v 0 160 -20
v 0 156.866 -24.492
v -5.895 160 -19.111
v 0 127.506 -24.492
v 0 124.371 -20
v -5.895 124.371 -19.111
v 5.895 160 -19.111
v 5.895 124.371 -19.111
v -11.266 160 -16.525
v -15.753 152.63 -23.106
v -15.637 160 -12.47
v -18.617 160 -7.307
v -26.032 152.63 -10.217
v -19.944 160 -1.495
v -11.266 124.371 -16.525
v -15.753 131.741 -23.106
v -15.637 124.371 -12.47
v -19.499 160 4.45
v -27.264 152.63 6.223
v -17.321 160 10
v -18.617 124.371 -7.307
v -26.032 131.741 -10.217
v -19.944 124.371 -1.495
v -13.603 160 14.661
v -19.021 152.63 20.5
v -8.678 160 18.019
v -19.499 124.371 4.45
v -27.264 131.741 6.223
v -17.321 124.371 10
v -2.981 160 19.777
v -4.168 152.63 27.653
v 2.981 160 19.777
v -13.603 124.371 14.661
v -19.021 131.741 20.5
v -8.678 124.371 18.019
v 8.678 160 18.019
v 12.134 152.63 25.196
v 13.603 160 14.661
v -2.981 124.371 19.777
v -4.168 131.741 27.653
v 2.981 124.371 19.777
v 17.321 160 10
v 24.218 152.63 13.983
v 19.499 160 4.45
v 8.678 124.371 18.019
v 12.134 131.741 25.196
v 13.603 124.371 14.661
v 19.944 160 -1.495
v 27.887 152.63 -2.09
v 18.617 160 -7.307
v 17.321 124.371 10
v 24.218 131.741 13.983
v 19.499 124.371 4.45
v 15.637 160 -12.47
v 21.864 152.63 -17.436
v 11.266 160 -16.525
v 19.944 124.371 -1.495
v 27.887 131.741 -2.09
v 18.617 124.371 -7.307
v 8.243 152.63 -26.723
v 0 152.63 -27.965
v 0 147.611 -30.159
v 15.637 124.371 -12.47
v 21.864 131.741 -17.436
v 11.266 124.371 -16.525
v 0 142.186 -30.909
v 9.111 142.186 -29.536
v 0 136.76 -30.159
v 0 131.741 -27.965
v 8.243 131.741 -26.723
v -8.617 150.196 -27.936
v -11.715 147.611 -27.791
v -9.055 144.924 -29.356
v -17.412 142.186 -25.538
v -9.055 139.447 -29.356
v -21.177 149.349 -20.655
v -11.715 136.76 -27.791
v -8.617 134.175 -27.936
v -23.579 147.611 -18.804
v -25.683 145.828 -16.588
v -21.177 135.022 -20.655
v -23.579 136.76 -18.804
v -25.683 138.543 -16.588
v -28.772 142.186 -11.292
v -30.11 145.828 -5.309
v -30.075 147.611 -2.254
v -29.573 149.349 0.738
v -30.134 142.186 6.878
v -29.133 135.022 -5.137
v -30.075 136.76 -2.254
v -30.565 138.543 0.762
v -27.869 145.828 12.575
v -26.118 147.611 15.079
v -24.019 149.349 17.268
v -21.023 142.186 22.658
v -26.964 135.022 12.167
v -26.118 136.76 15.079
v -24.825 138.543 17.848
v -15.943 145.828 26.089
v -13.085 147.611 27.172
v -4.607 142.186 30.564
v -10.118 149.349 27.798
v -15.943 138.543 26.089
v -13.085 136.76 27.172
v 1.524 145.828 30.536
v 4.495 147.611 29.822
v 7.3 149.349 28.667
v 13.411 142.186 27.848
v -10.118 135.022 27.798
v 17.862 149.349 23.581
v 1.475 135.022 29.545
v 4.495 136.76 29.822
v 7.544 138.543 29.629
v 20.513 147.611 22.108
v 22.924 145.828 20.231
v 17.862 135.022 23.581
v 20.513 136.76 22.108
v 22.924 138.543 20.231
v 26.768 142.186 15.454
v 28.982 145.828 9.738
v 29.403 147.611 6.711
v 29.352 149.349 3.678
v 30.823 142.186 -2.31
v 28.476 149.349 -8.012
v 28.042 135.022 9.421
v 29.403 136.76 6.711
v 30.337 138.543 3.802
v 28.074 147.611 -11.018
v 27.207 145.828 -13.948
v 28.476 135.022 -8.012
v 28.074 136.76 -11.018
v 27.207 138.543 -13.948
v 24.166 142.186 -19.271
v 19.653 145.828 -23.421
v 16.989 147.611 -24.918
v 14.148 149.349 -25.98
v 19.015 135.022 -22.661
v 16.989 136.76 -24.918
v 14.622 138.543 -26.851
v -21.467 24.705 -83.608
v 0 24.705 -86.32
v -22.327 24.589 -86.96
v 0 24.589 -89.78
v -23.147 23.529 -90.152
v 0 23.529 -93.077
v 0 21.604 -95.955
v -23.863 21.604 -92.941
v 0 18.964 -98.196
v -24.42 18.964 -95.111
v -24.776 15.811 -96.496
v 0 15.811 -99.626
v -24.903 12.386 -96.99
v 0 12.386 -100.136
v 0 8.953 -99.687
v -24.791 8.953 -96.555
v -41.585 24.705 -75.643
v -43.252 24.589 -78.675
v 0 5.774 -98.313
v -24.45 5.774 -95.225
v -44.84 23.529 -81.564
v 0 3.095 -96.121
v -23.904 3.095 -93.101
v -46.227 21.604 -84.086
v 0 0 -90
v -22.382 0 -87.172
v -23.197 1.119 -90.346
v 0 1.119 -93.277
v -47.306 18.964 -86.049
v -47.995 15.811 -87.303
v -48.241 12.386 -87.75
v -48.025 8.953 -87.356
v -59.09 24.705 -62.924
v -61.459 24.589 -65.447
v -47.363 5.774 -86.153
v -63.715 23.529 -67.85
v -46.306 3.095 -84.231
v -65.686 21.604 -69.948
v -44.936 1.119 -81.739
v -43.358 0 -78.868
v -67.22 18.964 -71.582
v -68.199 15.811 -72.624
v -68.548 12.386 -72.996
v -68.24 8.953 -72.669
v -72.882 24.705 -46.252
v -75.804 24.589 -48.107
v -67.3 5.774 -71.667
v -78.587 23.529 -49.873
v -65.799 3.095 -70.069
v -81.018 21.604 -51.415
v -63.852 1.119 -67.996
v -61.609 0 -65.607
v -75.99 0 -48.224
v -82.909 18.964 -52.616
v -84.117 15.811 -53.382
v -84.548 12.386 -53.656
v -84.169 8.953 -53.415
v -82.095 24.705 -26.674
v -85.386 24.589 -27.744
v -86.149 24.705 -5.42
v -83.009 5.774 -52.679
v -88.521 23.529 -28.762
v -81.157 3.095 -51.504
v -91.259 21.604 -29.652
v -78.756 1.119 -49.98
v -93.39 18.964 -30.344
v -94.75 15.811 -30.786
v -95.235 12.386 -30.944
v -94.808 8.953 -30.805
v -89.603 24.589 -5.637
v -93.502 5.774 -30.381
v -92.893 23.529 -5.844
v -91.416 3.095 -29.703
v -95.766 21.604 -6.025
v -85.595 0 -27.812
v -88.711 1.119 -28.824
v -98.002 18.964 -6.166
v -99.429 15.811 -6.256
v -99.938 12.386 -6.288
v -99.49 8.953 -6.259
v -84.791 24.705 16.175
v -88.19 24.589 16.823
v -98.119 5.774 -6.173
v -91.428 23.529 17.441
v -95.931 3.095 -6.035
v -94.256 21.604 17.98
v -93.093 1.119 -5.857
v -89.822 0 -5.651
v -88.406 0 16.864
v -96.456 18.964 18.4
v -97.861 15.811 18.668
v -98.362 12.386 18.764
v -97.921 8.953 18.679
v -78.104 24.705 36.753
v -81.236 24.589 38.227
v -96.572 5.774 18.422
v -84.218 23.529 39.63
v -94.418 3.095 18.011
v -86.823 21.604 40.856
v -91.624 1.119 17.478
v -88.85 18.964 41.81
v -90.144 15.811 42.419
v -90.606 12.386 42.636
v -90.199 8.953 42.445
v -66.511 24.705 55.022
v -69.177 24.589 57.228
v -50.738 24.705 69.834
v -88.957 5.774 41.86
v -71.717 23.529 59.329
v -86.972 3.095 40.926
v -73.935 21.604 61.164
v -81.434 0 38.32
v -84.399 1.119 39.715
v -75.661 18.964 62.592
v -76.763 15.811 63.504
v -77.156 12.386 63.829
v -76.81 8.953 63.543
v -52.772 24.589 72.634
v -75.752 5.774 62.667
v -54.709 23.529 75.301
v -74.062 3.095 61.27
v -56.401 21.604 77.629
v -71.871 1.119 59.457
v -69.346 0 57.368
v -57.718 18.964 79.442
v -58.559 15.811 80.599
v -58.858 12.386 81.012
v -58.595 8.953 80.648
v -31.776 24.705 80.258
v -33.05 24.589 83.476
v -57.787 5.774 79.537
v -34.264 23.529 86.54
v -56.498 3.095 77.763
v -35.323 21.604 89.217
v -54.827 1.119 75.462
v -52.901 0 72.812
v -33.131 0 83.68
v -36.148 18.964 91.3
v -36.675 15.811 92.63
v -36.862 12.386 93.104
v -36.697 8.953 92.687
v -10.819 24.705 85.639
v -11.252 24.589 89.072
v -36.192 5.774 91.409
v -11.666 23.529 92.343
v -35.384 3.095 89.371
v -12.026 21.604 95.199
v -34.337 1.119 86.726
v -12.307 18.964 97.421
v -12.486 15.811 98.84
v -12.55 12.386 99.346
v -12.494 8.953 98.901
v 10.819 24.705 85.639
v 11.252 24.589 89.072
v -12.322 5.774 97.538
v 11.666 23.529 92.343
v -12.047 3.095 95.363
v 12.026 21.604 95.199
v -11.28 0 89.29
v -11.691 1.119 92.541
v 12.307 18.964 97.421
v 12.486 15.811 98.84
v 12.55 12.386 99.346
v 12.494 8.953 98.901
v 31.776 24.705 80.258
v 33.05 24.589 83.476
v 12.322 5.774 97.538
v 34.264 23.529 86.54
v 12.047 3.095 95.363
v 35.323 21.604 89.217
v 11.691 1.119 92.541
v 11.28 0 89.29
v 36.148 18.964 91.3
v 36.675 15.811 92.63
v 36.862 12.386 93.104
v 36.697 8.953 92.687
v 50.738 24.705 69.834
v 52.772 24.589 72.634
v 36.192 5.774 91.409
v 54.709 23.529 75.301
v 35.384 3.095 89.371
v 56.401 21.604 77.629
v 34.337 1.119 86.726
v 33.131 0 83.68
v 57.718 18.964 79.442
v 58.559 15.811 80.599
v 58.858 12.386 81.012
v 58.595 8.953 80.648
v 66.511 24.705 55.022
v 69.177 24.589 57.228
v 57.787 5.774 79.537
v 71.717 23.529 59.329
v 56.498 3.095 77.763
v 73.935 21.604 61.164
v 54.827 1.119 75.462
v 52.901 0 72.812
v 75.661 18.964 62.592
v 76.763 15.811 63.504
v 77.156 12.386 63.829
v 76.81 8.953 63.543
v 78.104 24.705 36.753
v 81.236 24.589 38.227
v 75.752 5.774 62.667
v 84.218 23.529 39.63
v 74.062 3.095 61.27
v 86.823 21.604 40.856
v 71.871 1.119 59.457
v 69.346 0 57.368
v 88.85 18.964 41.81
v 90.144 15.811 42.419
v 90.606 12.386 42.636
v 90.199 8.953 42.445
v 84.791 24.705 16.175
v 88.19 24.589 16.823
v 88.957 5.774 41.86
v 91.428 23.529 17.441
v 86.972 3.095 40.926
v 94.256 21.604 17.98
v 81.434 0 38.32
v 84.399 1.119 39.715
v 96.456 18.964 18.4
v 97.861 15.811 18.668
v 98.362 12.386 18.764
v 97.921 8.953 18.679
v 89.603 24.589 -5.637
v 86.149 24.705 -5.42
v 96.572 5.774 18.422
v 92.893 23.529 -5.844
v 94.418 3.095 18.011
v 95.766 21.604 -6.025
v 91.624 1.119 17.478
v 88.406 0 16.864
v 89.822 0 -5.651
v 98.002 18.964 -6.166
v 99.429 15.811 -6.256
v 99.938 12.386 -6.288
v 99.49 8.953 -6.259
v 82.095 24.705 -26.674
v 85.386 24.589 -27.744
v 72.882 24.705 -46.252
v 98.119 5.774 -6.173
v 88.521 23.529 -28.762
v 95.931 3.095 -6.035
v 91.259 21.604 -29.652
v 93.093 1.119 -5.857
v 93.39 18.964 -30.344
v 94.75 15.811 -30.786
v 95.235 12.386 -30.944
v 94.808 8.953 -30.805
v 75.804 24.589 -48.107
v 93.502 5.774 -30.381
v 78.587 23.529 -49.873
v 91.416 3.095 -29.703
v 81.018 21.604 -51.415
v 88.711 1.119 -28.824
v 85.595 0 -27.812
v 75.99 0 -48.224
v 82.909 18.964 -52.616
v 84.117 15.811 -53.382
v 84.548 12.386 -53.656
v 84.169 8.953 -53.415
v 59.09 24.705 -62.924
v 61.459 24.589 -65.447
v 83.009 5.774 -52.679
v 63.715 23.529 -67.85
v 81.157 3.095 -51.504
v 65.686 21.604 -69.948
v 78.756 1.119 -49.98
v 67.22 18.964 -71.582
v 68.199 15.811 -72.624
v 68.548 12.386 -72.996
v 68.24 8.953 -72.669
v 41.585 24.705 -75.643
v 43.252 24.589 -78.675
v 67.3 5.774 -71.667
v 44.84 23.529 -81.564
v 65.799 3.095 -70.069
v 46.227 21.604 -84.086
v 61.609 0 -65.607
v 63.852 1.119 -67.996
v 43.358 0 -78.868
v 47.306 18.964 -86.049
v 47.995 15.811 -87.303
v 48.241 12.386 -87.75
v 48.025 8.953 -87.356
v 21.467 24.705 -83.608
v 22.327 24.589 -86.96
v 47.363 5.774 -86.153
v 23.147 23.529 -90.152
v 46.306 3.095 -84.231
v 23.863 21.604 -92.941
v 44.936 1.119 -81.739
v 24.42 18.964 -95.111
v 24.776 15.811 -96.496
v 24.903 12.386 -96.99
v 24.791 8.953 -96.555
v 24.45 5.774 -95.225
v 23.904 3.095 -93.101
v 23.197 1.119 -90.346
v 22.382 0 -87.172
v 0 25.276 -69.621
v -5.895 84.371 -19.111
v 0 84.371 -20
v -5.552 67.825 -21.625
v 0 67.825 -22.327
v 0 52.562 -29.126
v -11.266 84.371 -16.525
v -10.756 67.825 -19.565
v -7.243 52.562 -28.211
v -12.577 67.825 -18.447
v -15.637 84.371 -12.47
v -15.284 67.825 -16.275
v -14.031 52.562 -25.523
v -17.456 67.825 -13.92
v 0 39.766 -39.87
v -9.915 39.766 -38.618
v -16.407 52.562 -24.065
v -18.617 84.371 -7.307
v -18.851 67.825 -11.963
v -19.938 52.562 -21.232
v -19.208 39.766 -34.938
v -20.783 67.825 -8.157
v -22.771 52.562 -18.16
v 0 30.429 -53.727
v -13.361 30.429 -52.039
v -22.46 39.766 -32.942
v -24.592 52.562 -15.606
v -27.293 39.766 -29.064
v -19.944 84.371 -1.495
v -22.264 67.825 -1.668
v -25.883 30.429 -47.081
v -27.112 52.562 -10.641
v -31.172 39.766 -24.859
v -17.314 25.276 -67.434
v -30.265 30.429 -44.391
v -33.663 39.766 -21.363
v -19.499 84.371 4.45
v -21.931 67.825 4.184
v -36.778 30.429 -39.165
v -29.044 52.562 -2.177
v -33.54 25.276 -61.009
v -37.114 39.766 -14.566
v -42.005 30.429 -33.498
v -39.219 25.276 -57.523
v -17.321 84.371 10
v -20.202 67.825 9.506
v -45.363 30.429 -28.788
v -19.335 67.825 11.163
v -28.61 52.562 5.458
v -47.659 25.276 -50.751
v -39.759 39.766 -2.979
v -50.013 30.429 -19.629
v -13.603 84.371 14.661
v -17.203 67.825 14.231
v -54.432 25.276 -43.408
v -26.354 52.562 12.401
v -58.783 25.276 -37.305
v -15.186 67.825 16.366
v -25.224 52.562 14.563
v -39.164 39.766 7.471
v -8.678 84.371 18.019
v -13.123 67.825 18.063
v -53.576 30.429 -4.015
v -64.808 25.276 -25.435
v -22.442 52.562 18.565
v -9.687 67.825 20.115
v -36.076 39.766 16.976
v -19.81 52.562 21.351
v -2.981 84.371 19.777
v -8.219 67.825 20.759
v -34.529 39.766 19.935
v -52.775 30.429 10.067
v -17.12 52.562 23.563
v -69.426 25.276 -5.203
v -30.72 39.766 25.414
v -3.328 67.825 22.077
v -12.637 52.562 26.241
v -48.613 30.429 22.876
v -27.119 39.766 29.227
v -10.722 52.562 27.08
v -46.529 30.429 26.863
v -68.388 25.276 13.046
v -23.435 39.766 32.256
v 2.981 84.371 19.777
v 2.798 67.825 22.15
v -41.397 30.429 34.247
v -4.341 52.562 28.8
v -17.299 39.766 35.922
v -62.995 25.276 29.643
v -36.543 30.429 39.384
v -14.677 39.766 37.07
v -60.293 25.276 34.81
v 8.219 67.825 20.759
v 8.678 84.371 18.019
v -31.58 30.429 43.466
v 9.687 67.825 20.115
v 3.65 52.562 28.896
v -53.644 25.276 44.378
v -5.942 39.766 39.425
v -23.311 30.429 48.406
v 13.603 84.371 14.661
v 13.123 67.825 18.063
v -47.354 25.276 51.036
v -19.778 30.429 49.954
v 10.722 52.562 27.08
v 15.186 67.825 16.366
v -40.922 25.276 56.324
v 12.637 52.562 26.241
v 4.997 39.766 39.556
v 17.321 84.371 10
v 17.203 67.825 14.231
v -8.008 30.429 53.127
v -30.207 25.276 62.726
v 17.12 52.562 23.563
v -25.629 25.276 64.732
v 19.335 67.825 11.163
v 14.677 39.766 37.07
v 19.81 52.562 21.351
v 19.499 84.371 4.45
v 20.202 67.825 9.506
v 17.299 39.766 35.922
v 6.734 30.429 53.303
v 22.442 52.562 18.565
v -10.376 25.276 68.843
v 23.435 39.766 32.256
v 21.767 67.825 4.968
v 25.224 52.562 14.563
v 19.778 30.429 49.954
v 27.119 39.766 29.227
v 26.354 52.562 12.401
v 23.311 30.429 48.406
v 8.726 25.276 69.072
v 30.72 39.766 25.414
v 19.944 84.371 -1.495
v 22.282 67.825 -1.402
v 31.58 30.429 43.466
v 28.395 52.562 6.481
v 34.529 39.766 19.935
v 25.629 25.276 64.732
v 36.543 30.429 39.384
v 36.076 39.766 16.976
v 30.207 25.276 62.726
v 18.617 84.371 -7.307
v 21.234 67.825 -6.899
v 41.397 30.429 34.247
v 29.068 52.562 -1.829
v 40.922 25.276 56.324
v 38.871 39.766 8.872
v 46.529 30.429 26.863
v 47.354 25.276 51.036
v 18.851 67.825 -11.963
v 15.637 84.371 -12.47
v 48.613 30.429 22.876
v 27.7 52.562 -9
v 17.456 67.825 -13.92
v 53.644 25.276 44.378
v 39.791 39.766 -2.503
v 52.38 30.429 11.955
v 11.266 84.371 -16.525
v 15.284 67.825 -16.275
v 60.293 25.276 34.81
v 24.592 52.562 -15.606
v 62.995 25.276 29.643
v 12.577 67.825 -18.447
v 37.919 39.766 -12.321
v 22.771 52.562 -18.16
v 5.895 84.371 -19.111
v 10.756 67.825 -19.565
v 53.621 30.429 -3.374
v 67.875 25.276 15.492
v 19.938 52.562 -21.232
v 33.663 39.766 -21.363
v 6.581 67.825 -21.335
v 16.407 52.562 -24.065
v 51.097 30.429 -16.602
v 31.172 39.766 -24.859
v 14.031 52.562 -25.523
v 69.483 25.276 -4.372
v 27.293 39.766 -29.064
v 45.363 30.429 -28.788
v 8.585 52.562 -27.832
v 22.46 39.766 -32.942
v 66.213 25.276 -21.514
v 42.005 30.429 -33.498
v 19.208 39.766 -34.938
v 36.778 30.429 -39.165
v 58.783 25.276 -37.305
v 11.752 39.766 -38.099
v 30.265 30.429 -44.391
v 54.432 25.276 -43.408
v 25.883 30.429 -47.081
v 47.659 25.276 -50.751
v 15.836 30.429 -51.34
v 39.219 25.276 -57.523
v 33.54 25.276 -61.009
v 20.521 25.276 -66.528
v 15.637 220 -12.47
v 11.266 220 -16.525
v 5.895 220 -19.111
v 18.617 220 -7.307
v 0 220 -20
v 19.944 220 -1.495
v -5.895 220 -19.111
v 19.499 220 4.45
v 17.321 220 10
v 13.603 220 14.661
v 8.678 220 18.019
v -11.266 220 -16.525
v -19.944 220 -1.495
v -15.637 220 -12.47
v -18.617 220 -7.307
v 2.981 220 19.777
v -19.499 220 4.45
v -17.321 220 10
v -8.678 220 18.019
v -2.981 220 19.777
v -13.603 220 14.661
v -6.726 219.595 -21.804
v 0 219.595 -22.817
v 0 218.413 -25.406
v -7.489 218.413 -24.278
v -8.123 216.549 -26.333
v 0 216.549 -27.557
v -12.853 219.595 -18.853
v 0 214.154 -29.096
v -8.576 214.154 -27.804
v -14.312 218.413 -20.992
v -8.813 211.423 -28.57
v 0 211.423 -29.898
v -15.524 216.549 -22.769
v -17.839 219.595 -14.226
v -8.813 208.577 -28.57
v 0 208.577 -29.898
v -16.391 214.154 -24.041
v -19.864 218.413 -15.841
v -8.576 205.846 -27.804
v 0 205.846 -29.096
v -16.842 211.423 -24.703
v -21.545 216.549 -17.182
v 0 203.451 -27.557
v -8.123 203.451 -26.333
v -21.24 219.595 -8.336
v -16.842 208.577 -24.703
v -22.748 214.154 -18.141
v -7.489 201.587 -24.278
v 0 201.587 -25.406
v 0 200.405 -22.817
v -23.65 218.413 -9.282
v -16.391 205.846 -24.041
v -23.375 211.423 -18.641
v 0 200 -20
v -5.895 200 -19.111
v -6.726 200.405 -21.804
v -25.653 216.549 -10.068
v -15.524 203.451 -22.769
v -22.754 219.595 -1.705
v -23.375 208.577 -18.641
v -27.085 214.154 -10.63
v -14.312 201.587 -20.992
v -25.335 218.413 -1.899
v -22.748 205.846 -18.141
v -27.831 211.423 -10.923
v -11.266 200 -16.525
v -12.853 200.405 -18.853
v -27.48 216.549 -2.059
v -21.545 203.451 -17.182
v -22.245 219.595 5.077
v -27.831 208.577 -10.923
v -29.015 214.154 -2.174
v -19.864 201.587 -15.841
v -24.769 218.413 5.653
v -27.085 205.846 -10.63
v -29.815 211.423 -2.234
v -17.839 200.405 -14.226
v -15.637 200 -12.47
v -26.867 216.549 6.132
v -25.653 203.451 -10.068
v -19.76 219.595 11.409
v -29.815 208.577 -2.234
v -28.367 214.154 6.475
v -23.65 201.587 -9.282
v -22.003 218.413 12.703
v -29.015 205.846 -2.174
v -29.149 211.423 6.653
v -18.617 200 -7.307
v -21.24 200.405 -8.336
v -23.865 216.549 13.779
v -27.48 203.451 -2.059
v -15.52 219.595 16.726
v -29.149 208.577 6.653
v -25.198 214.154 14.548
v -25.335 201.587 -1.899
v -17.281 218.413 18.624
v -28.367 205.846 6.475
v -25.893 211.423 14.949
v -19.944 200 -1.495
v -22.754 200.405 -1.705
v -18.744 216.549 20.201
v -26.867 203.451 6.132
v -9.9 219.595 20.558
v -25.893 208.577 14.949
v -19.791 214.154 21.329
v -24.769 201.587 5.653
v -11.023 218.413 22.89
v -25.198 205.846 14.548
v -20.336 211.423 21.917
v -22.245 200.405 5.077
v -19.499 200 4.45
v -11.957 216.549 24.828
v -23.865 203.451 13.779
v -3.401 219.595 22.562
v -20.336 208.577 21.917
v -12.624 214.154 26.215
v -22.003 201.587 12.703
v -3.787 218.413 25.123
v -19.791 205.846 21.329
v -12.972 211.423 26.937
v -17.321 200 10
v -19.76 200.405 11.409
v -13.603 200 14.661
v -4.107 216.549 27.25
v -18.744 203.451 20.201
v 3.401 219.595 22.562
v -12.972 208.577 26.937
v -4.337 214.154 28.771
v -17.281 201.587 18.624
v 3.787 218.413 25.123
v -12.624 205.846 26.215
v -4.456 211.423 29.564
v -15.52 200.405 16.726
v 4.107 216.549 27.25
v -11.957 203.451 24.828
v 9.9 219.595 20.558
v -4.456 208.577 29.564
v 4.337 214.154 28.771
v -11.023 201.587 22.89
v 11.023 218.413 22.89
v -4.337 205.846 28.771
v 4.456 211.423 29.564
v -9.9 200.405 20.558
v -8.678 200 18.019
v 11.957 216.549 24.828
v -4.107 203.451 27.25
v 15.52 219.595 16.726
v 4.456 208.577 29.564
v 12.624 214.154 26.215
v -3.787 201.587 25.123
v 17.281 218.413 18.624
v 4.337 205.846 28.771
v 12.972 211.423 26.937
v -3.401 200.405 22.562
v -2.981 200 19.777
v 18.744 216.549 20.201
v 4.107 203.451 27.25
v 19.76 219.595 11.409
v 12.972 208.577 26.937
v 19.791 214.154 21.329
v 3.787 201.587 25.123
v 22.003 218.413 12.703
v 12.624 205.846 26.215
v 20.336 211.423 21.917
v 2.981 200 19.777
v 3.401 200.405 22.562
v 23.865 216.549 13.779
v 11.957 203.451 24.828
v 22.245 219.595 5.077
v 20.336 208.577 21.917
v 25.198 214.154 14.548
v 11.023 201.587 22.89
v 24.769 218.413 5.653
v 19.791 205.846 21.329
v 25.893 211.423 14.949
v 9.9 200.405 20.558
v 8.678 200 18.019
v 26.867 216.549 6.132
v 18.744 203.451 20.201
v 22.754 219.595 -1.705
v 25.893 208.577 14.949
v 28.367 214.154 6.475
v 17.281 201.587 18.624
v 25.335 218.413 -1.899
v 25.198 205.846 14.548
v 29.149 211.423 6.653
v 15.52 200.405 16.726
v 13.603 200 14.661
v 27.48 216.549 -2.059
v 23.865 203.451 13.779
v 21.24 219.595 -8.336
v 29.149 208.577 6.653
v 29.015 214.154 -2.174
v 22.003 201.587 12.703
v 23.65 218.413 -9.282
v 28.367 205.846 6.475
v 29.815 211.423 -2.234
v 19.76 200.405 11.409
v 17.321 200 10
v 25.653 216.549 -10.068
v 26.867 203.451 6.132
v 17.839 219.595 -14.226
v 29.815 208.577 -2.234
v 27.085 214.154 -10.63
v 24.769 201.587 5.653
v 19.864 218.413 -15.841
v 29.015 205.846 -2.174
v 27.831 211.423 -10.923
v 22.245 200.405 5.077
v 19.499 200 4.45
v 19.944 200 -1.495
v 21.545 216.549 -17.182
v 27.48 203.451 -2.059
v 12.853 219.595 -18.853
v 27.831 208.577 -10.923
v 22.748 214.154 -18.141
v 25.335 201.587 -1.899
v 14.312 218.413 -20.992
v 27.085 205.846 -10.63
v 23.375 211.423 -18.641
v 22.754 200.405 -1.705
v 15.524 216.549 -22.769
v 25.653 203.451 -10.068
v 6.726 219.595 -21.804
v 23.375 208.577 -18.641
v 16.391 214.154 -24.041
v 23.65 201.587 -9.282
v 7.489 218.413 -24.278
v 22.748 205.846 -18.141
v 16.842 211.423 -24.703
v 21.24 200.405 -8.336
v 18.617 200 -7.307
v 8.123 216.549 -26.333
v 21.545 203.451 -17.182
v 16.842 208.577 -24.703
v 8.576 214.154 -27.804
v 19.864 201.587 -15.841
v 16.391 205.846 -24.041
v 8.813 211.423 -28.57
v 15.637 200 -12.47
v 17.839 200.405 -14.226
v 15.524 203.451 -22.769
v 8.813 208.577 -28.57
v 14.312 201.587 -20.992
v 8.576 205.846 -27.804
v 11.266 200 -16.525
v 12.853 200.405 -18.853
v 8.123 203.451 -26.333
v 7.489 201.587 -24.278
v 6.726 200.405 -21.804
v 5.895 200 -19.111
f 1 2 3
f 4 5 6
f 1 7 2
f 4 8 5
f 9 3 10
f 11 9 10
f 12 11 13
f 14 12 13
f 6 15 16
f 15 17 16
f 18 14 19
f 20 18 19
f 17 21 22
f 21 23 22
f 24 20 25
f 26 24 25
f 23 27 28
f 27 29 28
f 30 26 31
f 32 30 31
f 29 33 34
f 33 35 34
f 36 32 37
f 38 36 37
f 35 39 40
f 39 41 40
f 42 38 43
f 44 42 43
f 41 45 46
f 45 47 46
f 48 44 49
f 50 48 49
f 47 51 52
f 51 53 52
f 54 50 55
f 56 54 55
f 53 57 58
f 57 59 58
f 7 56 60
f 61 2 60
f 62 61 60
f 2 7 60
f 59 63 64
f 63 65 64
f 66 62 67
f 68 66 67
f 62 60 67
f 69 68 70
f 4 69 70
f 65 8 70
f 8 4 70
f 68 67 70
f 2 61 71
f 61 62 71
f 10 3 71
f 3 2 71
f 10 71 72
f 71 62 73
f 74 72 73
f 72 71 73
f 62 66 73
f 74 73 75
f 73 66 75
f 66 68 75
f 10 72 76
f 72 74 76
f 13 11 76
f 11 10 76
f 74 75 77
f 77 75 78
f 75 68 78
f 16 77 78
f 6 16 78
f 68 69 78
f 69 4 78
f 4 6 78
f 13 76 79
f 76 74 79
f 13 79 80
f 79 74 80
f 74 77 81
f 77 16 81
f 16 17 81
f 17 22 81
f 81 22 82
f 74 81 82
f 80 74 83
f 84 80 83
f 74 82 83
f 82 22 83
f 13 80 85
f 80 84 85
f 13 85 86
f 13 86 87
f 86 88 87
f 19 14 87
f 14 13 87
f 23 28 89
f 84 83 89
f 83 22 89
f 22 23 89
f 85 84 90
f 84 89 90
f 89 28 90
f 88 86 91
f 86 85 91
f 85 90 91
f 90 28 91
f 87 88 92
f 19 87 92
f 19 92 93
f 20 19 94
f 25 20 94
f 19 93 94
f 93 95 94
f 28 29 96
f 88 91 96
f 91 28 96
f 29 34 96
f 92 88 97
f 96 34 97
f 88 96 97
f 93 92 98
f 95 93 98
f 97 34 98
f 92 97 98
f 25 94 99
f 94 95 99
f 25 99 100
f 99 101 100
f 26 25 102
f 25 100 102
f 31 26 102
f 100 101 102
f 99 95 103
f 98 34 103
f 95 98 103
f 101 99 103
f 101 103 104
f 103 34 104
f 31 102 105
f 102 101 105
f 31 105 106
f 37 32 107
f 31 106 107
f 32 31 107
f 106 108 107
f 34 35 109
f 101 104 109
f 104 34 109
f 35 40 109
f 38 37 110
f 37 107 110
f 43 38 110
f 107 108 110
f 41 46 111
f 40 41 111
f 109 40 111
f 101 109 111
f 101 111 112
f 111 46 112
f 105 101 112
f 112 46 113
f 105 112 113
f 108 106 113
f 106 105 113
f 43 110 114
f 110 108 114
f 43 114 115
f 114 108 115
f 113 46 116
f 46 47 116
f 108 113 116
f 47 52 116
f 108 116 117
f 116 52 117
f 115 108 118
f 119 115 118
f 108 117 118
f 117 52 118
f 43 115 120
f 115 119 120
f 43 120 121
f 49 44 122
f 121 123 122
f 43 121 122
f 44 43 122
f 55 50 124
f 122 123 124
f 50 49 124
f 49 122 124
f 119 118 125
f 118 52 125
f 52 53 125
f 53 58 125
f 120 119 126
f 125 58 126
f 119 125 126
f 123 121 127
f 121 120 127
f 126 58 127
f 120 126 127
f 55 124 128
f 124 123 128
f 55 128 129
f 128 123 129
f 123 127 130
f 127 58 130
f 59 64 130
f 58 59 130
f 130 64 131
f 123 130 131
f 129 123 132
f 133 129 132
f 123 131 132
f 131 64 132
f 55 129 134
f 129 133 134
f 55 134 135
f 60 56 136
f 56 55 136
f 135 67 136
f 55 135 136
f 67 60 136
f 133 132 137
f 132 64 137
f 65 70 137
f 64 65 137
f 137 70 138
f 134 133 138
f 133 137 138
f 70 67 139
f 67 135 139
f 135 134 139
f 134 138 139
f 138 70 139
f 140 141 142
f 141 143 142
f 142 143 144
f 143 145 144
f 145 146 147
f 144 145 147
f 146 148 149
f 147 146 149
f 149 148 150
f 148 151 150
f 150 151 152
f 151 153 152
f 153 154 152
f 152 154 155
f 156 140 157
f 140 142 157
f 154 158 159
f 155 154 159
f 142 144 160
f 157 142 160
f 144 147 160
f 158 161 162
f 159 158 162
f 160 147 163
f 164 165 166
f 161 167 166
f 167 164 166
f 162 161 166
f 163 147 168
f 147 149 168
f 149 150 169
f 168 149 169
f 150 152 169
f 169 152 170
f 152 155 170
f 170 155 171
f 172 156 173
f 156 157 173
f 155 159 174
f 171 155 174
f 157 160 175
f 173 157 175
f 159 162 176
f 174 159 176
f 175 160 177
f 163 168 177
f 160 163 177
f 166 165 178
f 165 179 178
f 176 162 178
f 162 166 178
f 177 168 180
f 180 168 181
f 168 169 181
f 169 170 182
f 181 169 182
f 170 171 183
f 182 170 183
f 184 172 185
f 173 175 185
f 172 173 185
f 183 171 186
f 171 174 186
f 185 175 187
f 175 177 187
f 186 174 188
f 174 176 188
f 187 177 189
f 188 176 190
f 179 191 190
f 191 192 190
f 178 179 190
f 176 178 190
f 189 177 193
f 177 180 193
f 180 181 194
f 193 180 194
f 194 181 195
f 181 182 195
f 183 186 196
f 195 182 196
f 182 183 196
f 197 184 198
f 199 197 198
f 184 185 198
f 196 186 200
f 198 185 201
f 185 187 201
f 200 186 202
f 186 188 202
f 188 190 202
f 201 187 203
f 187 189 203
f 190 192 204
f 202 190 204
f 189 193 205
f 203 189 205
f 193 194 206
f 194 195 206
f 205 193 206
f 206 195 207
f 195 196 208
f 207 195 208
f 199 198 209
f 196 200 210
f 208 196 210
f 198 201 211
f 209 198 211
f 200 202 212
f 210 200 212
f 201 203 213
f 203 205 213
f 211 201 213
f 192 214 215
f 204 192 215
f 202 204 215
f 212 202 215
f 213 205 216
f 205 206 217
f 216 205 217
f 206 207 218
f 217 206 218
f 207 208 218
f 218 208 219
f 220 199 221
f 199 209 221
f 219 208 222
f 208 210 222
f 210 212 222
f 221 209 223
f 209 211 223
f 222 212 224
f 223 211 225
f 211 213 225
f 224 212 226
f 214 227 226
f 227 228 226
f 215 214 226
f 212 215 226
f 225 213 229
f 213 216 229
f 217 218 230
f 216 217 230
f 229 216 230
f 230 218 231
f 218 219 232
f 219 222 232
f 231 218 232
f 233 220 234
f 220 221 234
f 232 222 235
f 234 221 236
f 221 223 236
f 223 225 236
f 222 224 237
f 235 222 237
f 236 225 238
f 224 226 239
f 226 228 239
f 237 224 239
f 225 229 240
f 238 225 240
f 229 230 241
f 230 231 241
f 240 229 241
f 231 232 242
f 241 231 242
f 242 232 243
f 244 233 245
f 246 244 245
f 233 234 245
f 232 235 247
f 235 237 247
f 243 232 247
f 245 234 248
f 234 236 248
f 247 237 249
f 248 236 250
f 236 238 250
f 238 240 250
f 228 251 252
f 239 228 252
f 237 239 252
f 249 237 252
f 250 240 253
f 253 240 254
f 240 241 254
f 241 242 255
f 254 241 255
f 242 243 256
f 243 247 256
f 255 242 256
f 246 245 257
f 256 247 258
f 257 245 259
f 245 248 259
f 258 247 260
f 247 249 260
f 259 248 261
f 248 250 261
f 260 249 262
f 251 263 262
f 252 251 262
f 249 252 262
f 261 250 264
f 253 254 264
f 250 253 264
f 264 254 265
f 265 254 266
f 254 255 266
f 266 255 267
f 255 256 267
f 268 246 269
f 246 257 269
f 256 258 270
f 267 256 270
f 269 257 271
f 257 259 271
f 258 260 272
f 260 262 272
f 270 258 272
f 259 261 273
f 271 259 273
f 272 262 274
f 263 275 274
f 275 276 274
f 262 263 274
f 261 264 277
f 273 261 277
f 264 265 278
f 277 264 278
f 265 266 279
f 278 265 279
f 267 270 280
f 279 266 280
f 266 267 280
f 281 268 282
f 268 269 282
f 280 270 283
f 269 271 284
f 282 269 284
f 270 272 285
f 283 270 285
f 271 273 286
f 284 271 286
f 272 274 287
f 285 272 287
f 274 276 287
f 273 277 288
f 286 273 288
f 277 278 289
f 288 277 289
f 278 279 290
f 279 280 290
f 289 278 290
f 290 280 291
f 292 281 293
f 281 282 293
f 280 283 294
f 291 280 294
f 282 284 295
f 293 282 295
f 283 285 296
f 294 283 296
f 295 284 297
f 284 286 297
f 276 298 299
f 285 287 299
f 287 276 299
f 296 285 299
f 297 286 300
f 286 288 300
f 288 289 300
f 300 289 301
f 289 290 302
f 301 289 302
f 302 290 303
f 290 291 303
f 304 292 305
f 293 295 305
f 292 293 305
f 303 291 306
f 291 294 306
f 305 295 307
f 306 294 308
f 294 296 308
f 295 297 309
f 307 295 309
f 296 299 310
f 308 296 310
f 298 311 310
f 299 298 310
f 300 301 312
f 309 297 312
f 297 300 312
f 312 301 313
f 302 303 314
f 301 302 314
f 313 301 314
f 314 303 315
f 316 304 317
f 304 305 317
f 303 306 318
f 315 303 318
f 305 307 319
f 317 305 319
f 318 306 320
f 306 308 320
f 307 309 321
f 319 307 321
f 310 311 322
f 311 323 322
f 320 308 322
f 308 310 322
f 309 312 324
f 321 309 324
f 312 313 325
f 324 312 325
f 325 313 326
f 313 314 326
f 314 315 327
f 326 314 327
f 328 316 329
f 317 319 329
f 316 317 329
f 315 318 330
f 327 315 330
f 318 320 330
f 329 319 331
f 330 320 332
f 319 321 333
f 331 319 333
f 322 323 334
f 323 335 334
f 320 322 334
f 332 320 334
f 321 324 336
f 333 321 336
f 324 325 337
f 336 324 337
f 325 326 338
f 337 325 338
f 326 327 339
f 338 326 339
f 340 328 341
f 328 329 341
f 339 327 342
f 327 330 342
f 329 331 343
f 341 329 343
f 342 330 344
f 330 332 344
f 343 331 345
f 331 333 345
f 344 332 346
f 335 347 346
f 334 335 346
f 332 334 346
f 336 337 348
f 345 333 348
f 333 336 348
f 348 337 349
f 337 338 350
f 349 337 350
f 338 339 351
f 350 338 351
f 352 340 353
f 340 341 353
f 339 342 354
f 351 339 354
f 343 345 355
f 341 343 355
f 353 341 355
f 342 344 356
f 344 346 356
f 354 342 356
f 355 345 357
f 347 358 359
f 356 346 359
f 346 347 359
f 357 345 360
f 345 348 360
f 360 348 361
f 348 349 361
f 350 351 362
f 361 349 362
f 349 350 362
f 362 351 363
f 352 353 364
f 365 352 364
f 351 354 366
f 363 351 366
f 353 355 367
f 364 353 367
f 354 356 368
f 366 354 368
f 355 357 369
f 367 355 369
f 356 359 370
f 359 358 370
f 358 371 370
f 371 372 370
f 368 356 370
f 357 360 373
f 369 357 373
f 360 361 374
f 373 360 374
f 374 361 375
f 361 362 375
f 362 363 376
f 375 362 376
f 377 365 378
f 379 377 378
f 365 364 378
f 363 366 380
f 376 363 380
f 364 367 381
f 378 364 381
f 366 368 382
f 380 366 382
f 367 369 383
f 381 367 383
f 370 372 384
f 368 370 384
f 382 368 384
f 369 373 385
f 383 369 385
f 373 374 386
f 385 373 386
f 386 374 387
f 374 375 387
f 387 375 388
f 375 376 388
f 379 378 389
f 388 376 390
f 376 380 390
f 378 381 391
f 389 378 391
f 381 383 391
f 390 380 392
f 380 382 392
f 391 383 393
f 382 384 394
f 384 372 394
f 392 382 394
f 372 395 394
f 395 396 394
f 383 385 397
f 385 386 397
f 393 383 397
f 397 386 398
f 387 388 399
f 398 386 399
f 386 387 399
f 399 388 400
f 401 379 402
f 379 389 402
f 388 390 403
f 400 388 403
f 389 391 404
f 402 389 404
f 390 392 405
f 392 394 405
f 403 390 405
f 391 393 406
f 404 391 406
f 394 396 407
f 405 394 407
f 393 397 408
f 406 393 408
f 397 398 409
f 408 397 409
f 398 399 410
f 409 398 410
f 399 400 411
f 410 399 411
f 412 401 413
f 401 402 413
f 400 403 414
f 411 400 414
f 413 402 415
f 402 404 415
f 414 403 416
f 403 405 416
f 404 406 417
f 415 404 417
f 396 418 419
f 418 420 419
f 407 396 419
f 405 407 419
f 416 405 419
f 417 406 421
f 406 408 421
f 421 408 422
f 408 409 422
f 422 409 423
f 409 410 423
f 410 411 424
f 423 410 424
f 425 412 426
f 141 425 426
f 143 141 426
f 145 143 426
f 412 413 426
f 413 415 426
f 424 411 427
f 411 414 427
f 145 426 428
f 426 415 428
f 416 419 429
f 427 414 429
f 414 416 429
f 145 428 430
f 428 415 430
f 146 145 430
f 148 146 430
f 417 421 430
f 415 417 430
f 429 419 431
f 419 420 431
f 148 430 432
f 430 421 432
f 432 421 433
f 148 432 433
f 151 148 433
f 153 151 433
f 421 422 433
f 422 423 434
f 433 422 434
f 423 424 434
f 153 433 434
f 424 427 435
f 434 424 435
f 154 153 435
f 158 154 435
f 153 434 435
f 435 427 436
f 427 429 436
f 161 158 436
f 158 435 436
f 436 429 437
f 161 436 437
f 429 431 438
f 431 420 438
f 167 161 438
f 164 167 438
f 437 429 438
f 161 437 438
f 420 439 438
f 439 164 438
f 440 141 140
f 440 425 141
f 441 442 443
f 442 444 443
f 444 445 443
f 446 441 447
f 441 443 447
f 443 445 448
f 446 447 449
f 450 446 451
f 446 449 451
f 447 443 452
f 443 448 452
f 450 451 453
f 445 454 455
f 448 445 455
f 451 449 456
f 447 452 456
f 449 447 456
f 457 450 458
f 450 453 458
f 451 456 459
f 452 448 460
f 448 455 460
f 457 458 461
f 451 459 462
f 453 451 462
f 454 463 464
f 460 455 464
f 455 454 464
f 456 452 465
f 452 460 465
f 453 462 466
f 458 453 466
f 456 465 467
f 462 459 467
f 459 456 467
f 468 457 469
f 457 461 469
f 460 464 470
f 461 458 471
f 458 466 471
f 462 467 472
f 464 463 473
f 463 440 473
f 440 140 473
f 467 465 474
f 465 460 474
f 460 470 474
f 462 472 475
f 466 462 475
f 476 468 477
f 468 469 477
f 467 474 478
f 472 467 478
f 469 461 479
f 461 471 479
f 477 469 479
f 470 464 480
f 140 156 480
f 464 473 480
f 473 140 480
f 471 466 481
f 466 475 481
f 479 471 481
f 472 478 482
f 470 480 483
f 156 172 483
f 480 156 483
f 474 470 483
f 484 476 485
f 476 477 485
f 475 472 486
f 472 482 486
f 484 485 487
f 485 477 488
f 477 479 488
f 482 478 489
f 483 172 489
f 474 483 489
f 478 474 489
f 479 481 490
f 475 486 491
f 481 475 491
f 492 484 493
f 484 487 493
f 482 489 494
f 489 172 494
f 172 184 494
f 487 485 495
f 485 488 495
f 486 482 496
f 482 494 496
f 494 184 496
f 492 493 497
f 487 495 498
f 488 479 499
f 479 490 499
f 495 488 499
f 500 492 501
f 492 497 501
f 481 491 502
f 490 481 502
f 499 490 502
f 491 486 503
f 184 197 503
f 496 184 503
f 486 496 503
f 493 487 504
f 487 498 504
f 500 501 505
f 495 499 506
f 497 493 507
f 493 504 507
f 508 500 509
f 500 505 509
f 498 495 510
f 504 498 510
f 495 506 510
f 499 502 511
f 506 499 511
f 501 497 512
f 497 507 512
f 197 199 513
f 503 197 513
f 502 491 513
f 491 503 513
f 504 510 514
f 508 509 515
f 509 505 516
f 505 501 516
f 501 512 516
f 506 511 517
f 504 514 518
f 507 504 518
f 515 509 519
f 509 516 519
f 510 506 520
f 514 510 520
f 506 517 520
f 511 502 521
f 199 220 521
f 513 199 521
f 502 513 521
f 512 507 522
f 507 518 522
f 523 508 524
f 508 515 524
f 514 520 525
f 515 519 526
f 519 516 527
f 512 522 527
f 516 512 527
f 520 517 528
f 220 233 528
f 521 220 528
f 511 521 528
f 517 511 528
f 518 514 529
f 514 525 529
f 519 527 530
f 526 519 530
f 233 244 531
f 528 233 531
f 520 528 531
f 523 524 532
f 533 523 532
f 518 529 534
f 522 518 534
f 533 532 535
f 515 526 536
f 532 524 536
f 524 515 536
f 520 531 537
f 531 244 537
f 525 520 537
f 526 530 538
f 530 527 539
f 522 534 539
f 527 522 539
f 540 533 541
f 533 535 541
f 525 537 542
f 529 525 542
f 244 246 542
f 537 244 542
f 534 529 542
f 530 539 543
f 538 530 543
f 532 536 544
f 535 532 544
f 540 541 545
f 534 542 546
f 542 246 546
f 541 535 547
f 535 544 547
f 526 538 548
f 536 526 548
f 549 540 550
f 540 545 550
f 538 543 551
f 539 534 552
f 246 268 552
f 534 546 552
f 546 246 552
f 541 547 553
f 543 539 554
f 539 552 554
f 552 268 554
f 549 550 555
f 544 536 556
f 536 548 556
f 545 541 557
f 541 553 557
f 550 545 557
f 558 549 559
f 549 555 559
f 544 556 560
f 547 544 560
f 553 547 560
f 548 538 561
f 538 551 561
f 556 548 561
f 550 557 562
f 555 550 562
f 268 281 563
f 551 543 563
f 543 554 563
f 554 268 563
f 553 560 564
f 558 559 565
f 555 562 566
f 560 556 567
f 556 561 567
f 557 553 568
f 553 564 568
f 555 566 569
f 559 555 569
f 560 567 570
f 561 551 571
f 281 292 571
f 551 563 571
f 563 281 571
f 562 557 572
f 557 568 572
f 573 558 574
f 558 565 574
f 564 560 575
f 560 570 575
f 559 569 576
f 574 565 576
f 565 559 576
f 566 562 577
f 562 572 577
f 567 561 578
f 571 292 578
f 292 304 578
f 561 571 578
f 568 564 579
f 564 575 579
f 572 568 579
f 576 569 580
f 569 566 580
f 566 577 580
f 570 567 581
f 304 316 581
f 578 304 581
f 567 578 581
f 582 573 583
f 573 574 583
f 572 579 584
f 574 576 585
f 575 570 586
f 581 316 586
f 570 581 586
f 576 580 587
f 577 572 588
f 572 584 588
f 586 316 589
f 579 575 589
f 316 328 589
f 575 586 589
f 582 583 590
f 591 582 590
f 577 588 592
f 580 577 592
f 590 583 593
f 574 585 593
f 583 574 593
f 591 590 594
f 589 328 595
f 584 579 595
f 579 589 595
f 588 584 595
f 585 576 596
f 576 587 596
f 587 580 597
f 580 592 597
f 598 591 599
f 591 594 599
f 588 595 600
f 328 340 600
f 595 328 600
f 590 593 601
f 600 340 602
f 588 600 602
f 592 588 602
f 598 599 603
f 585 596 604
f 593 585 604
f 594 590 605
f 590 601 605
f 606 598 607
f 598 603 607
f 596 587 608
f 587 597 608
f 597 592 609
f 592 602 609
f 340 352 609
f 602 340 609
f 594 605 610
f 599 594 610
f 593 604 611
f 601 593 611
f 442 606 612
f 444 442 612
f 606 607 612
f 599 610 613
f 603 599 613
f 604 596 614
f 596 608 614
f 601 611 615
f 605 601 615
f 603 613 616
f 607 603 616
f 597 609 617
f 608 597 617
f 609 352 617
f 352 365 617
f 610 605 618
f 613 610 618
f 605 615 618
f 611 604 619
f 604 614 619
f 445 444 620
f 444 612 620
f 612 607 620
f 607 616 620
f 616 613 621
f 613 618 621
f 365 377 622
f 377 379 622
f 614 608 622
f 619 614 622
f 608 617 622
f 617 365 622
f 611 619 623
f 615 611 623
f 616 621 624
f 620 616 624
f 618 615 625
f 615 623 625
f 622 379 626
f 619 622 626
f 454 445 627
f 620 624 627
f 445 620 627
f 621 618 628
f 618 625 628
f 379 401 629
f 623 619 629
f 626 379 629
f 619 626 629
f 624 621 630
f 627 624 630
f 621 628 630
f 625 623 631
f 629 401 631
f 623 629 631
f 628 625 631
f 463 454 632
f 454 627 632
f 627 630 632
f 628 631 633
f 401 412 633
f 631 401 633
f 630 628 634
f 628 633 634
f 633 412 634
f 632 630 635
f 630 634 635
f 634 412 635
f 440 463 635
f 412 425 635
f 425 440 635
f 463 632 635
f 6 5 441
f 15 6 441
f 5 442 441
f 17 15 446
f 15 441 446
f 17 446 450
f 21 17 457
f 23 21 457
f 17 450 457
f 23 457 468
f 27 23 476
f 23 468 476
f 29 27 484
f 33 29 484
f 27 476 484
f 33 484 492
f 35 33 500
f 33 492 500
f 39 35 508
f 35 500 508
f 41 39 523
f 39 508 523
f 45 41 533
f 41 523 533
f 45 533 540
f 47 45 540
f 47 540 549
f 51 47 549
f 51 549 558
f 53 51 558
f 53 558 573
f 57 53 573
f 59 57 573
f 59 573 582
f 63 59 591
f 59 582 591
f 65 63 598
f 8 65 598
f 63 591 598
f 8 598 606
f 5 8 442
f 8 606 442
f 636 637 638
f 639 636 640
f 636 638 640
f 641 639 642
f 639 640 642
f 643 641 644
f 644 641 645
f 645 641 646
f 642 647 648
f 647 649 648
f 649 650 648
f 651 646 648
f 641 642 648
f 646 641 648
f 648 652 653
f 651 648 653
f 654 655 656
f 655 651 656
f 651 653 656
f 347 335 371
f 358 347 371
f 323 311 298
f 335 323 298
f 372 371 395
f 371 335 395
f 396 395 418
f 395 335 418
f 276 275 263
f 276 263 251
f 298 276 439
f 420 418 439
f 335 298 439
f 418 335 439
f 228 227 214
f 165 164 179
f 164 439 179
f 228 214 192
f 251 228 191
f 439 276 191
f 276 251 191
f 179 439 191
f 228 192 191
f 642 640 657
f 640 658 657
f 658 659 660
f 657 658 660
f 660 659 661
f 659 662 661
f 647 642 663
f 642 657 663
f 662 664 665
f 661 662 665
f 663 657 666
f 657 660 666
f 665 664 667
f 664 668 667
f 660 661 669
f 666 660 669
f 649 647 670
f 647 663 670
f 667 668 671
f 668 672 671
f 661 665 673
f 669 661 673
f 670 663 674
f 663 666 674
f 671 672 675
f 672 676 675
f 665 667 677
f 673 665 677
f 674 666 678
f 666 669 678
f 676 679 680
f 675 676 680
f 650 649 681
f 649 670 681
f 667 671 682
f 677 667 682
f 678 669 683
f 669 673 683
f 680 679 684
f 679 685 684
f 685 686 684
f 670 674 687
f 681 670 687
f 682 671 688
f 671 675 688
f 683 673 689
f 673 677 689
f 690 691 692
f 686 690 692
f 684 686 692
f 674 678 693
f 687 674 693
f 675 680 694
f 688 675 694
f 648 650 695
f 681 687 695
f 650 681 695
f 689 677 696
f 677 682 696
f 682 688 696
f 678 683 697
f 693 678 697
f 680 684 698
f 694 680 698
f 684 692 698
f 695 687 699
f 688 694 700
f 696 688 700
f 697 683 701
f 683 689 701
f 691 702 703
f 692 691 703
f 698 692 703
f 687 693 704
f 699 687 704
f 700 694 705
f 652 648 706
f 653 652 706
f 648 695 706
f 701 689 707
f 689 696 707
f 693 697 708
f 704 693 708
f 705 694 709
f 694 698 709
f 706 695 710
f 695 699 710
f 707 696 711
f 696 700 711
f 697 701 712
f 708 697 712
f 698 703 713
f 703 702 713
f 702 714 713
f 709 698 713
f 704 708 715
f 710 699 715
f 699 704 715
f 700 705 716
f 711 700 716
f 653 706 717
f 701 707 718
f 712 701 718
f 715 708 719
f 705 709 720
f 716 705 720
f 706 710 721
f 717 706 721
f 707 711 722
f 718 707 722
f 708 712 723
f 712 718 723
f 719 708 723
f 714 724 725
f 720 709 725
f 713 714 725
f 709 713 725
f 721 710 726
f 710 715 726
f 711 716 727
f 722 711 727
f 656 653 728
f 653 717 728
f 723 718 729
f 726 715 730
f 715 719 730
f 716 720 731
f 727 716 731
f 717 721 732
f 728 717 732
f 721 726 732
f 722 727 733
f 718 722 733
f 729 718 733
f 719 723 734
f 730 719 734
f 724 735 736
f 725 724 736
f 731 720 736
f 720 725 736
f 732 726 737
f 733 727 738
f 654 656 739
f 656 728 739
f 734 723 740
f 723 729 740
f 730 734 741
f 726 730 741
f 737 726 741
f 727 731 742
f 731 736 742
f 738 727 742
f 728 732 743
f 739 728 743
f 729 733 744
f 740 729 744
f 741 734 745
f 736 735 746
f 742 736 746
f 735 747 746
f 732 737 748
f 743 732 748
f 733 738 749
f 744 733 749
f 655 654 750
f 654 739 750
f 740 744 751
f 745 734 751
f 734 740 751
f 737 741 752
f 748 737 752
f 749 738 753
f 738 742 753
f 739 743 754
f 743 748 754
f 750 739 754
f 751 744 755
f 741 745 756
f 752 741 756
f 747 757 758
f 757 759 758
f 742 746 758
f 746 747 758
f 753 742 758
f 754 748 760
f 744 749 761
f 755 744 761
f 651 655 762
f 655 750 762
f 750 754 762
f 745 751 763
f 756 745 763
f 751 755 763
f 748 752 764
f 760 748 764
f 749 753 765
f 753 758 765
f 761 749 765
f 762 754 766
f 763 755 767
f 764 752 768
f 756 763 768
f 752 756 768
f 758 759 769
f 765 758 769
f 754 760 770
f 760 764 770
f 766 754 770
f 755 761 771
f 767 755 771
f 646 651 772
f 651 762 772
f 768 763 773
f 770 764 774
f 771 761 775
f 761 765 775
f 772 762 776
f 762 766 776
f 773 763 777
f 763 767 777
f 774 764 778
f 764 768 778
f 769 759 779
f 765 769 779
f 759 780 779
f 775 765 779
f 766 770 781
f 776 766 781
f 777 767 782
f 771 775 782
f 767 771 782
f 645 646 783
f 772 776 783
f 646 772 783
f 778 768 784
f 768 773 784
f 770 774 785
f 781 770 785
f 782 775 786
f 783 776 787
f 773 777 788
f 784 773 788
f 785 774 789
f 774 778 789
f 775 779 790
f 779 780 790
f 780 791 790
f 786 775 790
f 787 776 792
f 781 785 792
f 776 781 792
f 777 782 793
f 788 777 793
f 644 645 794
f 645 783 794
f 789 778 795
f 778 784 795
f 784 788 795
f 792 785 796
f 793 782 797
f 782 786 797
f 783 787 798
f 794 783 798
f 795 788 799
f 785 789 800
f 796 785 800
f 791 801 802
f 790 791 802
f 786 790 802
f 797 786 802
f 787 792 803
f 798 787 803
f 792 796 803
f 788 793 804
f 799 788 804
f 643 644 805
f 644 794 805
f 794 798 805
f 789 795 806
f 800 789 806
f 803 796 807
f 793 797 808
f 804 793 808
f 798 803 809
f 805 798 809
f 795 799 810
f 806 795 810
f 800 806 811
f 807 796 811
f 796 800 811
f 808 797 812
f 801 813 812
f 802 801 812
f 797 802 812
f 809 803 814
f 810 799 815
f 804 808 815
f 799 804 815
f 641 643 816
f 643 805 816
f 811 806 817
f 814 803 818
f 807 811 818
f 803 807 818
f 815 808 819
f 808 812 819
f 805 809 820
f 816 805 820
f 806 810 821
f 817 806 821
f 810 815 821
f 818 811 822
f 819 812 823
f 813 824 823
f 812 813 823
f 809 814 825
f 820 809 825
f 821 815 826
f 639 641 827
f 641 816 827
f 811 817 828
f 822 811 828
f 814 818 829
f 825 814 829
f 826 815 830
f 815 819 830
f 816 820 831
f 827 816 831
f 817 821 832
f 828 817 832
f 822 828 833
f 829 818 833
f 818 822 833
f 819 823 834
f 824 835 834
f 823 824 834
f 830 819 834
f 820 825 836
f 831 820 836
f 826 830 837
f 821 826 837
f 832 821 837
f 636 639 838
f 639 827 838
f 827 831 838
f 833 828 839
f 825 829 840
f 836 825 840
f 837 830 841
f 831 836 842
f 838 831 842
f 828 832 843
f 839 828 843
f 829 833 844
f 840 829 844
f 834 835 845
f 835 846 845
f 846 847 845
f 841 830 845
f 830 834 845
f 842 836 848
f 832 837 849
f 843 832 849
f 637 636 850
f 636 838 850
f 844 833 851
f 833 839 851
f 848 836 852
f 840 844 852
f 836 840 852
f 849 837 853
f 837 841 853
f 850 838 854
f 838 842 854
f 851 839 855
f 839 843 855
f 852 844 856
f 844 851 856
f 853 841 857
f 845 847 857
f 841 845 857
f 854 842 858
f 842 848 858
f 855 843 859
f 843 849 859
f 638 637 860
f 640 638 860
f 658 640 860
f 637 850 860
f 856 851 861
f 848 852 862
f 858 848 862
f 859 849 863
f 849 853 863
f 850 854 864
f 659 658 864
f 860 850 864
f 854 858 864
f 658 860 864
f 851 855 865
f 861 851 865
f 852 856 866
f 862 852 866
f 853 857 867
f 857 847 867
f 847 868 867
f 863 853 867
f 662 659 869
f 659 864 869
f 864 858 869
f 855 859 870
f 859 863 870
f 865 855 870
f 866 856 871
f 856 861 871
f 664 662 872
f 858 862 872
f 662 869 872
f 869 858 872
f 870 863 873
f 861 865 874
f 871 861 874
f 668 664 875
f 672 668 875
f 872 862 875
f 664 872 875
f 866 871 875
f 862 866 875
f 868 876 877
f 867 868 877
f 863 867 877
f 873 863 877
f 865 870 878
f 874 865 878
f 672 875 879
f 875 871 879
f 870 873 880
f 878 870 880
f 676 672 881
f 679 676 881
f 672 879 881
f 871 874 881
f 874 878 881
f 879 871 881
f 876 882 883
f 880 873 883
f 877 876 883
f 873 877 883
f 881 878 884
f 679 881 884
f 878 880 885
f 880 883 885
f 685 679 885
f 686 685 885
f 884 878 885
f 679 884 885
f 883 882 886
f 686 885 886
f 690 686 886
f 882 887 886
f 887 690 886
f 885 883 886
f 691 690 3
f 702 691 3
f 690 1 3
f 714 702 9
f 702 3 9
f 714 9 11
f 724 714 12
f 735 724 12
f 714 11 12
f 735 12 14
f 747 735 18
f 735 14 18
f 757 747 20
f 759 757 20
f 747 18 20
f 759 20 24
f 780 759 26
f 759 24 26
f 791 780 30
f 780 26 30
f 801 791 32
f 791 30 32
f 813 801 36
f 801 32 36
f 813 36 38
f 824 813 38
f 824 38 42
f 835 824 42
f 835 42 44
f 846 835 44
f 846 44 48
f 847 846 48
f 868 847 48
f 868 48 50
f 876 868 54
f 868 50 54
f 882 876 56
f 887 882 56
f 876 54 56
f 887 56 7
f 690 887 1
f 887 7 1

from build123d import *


with BuildPart() as part:
    # Sketch1 → Revolve1 (revolve)
    with BuildSketch(Plane.XY, mode=Mode.PRIVATE) as revolve1_sk:
        with BuildLine():
            Line((0, 0), (0, 220))
            Line((0, 220), (20, 220))
            ThreePointArc((20, 220), (30, 210), (20, 200))
            Line((20, 200), (20, 160))
            ThreePointArc((20, 160), (30.908939581, 142.185606368), (20, 124.371212737))
            Line((20, 124.371212737), (20, 84.371212737))
            ThreePointArc((20, 84.371212737), (39.870136229, 39.766347153), (86.319801124, 24.704973424))
            ThreePointArc((86.319801124, 24.704973424), (100, 14.116257913), (90, 0))
            Line((90, 0), (0, 0))
        make_face()
    revolve(revolve1_sk.sketch.rotate(Axis((0, 0, 0), (0, 1, 0)), 90), axis=Axis((0, 0, 0), (0, 1, 0)))


solid = part.part
